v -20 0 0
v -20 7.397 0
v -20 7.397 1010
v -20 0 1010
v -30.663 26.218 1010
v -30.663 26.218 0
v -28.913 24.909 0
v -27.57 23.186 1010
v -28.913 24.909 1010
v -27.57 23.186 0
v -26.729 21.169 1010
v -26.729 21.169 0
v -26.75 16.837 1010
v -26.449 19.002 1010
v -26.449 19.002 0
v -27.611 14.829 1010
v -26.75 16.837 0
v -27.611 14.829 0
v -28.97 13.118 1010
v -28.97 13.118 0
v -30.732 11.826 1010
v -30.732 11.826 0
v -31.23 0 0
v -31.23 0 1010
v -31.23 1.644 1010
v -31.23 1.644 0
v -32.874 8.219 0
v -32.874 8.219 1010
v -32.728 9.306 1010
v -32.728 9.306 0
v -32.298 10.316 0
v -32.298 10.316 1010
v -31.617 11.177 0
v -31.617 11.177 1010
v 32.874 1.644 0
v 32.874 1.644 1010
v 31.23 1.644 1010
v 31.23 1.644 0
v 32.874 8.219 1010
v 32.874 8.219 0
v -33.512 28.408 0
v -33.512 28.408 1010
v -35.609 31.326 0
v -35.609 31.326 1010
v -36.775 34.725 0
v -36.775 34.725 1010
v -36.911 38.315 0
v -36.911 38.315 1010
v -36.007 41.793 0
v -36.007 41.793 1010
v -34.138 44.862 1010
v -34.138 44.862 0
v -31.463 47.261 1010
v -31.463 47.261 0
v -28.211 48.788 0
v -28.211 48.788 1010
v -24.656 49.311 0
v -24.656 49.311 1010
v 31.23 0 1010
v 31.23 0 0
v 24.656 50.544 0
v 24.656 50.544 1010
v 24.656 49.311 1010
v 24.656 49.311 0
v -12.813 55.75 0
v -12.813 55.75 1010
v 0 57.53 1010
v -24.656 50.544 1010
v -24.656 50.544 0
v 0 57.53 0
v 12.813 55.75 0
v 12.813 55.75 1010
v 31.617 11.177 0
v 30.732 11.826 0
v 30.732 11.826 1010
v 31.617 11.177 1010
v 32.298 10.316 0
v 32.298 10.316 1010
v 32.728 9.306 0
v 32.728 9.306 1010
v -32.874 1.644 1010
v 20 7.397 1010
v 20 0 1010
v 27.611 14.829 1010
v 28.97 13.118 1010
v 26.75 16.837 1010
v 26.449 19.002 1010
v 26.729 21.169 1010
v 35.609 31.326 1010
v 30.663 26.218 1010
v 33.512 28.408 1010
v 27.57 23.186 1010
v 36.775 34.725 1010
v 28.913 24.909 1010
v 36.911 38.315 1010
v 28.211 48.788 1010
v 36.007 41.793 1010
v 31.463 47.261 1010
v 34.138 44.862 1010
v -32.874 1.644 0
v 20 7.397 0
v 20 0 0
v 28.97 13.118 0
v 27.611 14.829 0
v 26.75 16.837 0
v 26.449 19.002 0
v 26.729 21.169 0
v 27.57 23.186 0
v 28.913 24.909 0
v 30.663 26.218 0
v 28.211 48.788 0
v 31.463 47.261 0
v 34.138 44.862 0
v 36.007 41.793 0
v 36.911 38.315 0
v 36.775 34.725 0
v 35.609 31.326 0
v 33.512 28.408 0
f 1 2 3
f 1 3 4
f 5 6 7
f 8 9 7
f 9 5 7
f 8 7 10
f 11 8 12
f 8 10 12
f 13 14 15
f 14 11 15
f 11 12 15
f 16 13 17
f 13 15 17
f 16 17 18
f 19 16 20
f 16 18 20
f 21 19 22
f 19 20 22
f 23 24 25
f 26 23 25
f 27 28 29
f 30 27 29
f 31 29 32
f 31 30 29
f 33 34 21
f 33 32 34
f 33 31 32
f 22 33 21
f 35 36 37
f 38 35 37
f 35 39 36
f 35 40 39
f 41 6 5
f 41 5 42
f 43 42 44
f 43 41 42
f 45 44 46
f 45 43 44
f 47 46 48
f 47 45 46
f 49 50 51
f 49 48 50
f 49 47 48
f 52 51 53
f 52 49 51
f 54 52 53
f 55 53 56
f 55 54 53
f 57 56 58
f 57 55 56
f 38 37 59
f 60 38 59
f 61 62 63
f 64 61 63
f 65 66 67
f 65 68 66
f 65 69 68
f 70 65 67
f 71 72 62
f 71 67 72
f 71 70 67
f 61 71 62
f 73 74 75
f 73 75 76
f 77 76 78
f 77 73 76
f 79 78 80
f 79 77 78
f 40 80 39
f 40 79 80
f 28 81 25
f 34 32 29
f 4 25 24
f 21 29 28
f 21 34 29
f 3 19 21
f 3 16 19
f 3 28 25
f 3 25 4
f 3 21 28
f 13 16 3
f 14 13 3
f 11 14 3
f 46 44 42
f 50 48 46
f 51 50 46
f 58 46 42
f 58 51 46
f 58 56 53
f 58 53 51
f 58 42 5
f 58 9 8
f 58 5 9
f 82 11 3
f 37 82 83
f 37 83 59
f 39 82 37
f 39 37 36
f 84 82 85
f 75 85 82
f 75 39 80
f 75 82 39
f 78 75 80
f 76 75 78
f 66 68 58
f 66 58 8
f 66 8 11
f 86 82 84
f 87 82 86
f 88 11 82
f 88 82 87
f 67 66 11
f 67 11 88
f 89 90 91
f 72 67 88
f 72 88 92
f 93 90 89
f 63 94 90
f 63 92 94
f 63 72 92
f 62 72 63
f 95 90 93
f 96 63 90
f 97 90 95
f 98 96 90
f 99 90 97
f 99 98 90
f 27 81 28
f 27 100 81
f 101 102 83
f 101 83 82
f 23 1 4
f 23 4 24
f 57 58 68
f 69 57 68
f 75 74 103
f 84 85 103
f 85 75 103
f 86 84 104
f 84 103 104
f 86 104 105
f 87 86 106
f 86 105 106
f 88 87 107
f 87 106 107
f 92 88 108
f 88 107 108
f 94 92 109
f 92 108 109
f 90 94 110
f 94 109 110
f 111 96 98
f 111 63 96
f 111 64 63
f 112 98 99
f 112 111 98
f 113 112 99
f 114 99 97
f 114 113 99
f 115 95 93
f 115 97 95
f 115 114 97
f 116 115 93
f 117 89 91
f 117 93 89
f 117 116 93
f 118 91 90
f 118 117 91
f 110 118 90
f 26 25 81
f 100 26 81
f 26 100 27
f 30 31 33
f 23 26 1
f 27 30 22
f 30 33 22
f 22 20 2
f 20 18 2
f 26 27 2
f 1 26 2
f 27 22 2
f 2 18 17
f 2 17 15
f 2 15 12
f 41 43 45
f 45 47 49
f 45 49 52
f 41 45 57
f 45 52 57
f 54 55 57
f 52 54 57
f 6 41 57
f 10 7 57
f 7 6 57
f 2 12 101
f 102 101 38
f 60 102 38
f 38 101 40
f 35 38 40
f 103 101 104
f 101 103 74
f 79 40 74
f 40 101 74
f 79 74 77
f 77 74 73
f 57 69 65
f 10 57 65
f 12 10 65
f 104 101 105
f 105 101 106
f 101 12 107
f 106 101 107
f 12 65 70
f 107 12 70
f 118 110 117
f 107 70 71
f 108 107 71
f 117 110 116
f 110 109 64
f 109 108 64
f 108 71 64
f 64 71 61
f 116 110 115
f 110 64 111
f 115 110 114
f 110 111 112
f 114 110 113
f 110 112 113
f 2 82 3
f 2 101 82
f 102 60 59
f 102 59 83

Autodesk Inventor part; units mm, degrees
ref_plane "YZ Plane" through (0, 0, 0) normal (1, 0, 0) x (0, 1, 0)
ref_plane "XZ Plane" through (0, 0, 0) normal (0, 1, 0) x (-1, 0, 0)
sketch "Поручень" plane through (0, 0, 0) normal (0, 0, 1) x (1, 0, 0)
  line L0 (20.3655, -7.6059) -> (20.3655, -0.2092)
  line L1 (20.3655, -0.2092) -> (-19.6345, -0.2092)
  line L2 (-19.6345, -0.2092) -> (-19.6345, -7.6059)
  line L3 (-19.6345, -7.6059) -> (-30.865, -7.6059)
  line L4 (-30.865, -7.6059) -> (-30.865, -5.9622)
  line L5 (-30.865, -5.9622) -> (-32.5087, -5.9622)
  line L6 (-32.5087, -5.9622) -> (-32.5087, 0.6126)
  arc A0 (-30.367, 4.2203) -> (-32.5087, 0.6126) centre (-28.3995, 0.6126) ccw
  arc A1 (-30.367, 4.2203) -> (-30.2973, 18.6123) centre (-34.302, 11.4355) ccw
  arc A2 (-24.2902, 41.7054) -> (-30.2973, 18.6123) centre (-24.2902, 29.3776) ccw
  line L7 (-24.2902, 41.7054) -> (-24.2902, 42.9382)
  arc A3 (25.0211, 42.9382) -> (-24.2902, 42.9382) centre (0.3655, 2.9211) ccw
  line L8 (25.0211, 42.9382) -> (25.0211, 41.7054)
  arc A4 (31.0282, 18.6123) -> (25.0211, 41.7054) centre (25.0211, 29.3776) ccw
  arc A5 (31.0282, 18.6123) -> (31.0979, 4.2203) centre (35.033, 11.4355) ccw
  arc A6 (33.2397, 0.6126) -> (31.0979, 4.2203) centre (29.1304, 0.6126) ccw
  line L9 (33.2397, 0.6126) -> (33.2397, -5.9622)
  line L10 (33.2397, -5.9622) -> (31.596, -5.9622)
  line L11 (31.596, -5.9622) -> (31.596, -7.6059)
  line L12 (31.596, -7.6059) -> (20.3655, -7.6059)
  point P0 (0.3655, -0.2092)
  point P1 (0.3655, -7.6059)
sketch "Эскиз" plane through (0, 0, 0) normal (0, 0, 1) x (1, 0, 0)
  line L0 (20, 0) -> (20, 7.3967)
  line L1 (20, 7.3967) -> (-20, 7.3967)
  line L2 (-20, 7.3967) -> (-20, 0)
  line L3 (-20, 0) -> (-31.2305, 0)
  line L4 (-31.2305, 0) -> (-31.2305, 1.6437)
  line L5 (-31.2305, 1.6437) -> (-32.8742, 1.6437)
  line L6 (-32.8742, 1.6437) -> (-32.8742, 8.2186)
  arc A0 (-30.7325, 11.8262) -> (-32.8742, 8.2186) centre (-28.7649, 8.2186) ccw
  arc A1 (-30.7325, 11.8262) -> (-30.6628, 26.2183) centre (-34.6675, 19.0415) ccw
  arc A2 (-24.6557, 49.3113) -> (-30.6628, 26.2183) centre (-24.6557, 36.9835) ccw
  line L7 (-24.6557, 49.3113) -> (-24.6557, 50.5441)
  arc A3 (24.6557, 50.5441) -> (-24.6557, 50.5441) centre (0, 10.527) ccw
  line L8 (24.6557, 50.5441) -> (24.6557, 49.3113)
  arc A4 (30.6628, 26.2183) -> (24.6557, 49.3113) centre (24.6557, 36.9835) ccw
  arc A5 (30.6628, 26.2183) -> (30.7325, 11.8262) centre (34.6675, 19.0415) ccw
  arc A6 (32.8742, 8.2186) -> (30.7325, 11.8262) centre (28.7649, 8.2186) ccw
  line L9 (32.8742, 8.2186) -> (32.8742, 1.6437)
  line L10 (32.8742, 1.6437) -> (31.2305, 1.6437)
  line L11 (31.2305, 1.6437) -> (31.2305, 0)
  line L12 (31.2305, 0) -> (20, 0)
  point P0 (0, 0)
ref_plane "Начальная плоскость" through (0, 0, 0) normal (0, 0, 1) x (1, 0, 0)
ref_plane "РабПлоскость2" through (0, 0, 1010) normal (0, 0, 1) x (1, 0, 0)
extrude "Тело" add sketch "Эскиз" along normal up to surface (1010 mm away) from surface at 0
ref_plane "Конечная плоскость" through (0, 0, 1010) normal (0, 0, 1) x (1, 0, 0)
equation "\"ШИРИНА\" = 75"
equation "\"ТОЛЩВЫС\" = 58"
equation "\"СЕЧЕНИЕ_СМЕЩ\" = 0"
equation "\"G_OFFSET_END\" = 0"
equation "\"G_OFFSET_START\" = 0"
properties part number "Поручень" material "Древесина (дуб)"
